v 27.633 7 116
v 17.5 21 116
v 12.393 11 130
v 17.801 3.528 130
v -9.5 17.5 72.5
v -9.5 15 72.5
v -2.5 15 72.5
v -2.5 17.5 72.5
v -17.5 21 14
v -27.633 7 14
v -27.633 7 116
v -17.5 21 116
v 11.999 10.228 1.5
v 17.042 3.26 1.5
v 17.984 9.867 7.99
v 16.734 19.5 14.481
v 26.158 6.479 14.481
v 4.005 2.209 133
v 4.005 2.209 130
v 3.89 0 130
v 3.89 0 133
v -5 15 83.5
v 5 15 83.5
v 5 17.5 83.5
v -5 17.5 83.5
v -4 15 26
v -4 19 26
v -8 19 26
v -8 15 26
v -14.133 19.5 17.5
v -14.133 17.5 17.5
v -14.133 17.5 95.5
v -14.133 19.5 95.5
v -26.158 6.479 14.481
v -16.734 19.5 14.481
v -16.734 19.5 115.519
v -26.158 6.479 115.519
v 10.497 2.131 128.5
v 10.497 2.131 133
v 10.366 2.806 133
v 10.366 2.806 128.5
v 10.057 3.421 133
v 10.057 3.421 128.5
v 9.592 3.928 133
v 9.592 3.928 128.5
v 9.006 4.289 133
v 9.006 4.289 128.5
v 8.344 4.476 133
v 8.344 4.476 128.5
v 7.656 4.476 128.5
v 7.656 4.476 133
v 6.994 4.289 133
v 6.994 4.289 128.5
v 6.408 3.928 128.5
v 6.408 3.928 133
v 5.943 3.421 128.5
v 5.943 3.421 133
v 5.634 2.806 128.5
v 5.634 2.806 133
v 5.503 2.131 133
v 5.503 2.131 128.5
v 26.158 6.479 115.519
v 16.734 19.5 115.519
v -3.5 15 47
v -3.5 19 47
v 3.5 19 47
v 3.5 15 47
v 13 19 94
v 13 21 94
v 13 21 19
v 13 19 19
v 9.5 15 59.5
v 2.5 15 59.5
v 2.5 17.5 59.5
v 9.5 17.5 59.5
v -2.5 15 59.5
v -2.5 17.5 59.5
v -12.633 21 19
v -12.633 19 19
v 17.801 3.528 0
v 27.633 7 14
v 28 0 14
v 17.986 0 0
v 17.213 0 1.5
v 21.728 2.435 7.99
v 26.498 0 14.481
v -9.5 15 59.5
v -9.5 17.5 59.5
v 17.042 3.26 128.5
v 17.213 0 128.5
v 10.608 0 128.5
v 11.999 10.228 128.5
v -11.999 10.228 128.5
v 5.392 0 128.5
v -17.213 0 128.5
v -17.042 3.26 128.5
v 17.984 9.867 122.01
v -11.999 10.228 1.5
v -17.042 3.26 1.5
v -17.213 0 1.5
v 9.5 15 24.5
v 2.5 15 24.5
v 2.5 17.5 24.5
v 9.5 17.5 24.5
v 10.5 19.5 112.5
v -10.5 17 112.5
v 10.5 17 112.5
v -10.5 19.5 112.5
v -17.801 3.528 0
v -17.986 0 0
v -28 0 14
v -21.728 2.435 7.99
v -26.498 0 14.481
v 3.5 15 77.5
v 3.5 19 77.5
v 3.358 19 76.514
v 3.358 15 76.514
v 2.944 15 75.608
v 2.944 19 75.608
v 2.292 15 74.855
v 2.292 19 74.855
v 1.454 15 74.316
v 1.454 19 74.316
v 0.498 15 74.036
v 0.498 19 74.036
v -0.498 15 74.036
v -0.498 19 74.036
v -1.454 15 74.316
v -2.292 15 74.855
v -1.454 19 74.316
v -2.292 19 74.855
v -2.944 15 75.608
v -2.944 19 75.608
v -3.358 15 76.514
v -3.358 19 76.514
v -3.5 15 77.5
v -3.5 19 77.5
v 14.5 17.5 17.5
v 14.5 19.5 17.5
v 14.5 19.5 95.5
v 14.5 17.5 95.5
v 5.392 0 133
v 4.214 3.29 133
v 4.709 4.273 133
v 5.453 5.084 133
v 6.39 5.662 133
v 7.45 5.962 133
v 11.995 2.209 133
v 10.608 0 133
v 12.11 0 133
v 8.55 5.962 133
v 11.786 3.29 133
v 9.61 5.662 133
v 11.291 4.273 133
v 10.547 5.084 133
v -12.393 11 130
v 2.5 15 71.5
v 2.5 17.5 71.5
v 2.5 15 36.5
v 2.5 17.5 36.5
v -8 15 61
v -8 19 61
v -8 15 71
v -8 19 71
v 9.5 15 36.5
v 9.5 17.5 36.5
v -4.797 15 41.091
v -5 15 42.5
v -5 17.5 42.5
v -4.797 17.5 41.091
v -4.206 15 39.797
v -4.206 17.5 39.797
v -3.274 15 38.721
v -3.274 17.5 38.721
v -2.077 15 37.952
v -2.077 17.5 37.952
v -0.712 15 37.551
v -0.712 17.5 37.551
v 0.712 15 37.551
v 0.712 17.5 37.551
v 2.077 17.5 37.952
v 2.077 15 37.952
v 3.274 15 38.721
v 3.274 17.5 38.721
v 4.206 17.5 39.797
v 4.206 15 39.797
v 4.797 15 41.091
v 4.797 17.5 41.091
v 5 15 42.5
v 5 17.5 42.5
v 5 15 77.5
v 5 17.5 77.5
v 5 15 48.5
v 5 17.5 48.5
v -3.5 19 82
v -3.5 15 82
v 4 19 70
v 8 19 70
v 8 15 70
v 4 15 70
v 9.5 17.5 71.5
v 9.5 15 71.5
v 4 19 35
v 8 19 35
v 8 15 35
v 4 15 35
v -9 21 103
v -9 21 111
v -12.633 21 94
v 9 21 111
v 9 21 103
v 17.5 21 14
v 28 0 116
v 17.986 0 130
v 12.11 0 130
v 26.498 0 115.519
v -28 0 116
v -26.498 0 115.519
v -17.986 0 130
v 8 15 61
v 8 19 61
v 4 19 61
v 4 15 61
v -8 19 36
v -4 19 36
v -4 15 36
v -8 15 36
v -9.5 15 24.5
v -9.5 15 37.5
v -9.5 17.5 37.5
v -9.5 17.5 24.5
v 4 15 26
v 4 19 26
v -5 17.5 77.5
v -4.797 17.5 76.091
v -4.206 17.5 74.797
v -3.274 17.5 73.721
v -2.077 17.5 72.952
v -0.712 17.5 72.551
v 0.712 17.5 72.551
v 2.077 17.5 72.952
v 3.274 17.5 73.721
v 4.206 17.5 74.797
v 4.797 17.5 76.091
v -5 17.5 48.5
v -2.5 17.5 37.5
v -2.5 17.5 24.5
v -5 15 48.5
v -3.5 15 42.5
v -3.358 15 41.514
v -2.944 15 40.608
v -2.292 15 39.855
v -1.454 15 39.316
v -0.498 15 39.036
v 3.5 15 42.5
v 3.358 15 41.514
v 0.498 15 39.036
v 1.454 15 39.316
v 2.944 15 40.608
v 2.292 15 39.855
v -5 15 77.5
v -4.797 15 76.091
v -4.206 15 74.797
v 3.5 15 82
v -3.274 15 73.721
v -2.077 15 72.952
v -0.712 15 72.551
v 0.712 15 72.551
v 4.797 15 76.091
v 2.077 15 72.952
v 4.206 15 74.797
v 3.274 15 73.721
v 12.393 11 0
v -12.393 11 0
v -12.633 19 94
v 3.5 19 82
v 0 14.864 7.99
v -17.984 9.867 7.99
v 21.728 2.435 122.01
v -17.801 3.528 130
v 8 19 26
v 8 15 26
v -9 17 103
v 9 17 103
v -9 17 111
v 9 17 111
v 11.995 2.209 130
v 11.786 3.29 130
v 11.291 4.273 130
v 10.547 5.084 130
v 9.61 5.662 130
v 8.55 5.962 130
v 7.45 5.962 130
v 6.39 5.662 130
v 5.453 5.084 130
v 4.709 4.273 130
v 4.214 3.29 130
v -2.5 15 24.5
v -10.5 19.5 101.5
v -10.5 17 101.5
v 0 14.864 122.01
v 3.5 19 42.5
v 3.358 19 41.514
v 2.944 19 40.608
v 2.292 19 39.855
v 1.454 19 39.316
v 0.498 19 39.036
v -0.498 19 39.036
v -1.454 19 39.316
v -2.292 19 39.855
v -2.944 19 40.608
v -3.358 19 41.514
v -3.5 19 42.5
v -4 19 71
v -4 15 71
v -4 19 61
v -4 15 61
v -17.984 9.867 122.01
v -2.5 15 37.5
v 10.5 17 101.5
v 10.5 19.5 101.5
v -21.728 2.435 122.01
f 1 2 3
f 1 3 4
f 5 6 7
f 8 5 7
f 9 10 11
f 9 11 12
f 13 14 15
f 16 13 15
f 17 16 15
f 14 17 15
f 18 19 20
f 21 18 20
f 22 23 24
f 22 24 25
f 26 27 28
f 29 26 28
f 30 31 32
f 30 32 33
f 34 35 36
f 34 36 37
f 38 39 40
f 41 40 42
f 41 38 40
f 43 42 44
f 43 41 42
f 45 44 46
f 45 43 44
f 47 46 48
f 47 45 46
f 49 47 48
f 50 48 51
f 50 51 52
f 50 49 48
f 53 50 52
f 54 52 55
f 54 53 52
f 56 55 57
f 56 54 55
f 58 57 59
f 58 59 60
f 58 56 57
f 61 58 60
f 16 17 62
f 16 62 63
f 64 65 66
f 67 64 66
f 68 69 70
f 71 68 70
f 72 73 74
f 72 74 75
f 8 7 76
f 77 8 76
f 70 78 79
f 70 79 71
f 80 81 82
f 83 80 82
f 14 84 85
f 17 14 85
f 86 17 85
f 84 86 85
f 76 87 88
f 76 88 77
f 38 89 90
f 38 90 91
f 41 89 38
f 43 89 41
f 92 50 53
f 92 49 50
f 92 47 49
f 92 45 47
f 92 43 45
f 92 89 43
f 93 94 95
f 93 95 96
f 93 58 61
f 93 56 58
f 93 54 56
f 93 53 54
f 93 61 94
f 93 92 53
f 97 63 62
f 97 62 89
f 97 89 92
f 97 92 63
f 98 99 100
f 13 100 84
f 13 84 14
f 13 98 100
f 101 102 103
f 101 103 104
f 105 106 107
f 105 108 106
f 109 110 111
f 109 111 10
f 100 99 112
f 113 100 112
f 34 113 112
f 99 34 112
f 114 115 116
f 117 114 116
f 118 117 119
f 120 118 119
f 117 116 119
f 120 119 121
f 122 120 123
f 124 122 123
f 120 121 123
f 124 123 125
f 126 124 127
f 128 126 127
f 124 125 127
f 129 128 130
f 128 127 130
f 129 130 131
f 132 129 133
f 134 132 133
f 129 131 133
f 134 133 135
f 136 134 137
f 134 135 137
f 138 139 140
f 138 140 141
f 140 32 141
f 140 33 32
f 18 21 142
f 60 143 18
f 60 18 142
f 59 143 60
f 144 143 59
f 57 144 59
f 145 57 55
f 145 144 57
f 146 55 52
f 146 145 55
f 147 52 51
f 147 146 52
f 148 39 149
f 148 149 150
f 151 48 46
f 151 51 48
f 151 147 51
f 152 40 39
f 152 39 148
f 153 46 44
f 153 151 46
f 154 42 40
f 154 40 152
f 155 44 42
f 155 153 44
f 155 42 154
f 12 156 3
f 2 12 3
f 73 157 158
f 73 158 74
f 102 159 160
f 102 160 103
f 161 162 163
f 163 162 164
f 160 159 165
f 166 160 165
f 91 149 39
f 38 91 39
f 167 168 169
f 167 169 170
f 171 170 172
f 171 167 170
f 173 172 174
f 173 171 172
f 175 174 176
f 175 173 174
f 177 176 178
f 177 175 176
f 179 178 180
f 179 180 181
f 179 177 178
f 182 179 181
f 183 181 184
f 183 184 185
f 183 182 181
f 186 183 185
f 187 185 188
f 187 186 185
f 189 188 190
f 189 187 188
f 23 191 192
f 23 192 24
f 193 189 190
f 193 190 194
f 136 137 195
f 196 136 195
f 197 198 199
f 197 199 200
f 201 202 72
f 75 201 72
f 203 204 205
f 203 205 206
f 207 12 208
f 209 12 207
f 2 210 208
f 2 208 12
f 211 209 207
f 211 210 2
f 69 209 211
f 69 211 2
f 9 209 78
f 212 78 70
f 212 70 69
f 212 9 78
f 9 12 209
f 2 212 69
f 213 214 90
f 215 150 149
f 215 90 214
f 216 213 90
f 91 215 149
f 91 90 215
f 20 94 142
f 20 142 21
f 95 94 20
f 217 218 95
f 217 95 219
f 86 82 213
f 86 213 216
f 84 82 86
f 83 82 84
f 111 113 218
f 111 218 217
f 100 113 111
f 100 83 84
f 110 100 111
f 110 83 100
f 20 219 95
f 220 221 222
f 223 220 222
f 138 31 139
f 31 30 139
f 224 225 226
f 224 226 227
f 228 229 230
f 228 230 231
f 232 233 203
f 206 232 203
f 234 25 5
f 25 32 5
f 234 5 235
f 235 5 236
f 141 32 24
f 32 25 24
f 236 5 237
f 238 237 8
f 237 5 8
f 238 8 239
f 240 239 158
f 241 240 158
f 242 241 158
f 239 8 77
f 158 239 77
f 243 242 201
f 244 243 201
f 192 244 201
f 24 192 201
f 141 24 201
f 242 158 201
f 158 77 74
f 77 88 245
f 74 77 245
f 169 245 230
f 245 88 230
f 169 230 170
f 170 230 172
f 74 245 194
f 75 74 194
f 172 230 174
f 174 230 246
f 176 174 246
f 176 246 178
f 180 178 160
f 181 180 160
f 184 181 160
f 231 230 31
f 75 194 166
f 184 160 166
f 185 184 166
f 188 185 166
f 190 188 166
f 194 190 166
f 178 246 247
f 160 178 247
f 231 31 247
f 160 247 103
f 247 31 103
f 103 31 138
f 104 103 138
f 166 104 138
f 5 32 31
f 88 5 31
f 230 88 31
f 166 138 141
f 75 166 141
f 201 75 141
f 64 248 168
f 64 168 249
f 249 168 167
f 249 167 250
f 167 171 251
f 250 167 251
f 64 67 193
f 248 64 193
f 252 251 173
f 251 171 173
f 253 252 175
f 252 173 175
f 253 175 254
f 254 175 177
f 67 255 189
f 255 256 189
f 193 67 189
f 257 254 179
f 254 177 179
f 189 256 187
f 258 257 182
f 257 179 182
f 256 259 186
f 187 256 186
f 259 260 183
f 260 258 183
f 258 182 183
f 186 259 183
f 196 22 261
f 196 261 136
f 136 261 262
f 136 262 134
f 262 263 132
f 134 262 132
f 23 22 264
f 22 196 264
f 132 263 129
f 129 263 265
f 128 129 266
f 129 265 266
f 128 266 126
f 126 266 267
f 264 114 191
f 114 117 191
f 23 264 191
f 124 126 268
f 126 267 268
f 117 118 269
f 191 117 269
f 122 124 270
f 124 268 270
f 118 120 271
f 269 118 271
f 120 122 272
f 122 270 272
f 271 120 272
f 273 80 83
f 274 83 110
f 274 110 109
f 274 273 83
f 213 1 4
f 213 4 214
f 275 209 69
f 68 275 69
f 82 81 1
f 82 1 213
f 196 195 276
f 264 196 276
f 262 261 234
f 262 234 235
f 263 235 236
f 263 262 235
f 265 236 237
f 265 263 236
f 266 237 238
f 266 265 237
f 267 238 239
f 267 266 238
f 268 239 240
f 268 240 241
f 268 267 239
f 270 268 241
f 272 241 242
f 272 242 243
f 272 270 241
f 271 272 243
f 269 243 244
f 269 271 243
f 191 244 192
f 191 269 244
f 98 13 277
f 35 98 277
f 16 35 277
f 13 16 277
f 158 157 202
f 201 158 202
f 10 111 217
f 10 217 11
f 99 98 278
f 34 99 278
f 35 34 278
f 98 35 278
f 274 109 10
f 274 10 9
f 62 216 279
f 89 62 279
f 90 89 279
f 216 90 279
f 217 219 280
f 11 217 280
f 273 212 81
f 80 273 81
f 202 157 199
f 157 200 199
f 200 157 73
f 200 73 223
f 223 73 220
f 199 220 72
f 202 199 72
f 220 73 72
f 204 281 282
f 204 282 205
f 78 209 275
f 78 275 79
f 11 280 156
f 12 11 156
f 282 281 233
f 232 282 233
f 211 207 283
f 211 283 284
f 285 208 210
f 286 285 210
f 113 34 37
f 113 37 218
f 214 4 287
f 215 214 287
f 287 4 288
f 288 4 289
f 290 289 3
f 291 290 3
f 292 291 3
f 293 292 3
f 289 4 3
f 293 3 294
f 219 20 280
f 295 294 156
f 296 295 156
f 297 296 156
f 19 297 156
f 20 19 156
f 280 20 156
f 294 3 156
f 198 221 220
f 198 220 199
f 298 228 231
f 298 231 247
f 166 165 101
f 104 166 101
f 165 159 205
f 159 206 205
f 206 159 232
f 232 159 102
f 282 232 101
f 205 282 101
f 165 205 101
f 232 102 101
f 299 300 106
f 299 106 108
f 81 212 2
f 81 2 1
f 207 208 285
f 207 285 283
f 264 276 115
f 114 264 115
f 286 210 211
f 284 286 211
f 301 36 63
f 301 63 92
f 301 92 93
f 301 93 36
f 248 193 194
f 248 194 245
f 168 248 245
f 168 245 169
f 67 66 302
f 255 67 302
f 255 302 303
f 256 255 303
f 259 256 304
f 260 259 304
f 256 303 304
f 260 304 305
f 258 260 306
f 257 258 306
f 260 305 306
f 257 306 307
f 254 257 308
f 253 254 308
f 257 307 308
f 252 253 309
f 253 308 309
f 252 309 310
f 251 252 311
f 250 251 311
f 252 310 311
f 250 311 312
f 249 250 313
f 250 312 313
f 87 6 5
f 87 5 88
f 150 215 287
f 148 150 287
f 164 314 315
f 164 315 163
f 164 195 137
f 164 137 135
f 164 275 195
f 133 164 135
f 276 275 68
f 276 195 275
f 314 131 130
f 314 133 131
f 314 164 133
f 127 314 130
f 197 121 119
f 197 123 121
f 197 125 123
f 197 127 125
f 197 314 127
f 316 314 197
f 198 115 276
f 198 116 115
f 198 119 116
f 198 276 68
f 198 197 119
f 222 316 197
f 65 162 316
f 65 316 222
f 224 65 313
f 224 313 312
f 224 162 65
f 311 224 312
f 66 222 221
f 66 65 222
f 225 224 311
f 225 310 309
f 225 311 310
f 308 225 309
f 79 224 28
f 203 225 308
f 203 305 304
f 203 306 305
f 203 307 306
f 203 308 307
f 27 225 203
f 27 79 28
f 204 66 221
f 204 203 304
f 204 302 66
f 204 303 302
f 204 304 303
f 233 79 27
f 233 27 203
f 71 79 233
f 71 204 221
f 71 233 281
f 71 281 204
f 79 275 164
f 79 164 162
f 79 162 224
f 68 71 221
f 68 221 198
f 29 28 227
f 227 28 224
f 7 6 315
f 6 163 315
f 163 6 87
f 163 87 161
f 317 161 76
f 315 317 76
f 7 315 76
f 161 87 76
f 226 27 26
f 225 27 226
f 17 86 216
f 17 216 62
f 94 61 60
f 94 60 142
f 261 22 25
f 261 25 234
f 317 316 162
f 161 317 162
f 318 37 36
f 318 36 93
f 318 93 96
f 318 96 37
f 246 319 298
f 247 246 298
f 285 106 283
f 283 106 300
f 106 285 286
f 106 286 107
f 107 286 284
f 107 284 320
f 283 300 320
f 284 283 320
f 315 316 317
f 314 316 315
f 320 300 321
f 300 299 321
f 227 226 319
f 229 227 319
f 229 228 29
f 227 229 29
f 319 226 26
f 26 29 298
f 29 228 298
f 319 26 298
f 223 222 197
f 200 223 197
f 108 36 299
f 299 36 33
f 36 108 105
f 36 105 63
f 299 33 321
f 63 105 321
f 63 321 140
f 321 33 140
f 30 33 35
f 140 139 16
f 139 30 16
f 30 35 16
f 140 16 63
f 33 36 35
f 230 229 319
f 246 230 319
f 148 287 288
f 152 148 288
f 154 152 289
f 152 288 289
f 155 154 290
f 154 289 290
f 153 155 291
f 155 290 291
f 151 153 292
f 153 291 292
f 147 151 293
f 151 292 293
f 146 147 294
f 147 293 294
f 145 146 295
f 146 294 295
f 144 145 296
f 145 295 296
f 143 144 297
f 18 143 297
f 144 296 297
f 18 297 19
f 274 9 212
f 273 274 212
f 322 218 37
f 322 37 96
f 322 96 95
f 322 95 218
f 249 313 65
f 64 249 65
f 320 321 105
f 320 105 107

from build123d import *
from OCP.BRepFilletAPI import BRepFilletAPI_MakeChamfer

# Parameters (mm, degrees)
EXTRUDE1_DEPTH       = 130
CHAMFER1_SIZE        = 14
CHAMFER1_SIZE2       = 10
CHAMFER2_SIZE        = 10
CHAMFER2_SIZE2       = 14
EXTRUDE2_DEPTH       = 3
SKETCH3_W            = 25.633145545
SKETCH3_H            = 75
CUT_EXTRUDE1_DEPTH   = 11
SKETCH4_W            = 4
SKETCH4_H            = 9
SKETCH4_H_2          = 10
CUT_EXTRUDE2_DEPTH   = 15
LPATTERN1_COUNT      = 2
LPATTERN1_PITCH      = 35
SKETCH5_W            = 18
SKETCH5_H            = 8
CUT_EXTRUDE3_DEPTH   = 13
SHELL1_OUTLINE_W     = 28.633145545
SHELL1_OUTLINE_H     = 78
SHELL1_OUTLINE_W_2   = 21
SHELL1_OUTLINE_H_2   = 11
SHELL1_DEPTH         = 15
SHELL1_START         = 15
SHELL1_2_OUTLINE_W   = 28.633145545
SHELL1_2_OUTLINE_H   = 78
SHELL1_2_OUTLINE_W_2 = 7
SHELL1_2_OUTLINE_H_2 = 13
SHELL1_2_OUTLINE_H_3 = 12
SHELL1_2_DEPTH       = 2.5
SHELL1_3_OUTLINE_W   = 21
SHELL1_3_OUTLINE_H   = 11
SHELL1_3_DEPTH       = 2
SHELL1_START_2       = 14.48069758
SHELL1_4_DEPTH       = 101.03860484
SHELL1_START_3       = 95.5
SHELL1_5_DEPTH       = 6
SHELL1_START_4       = 101.5
SHELL1_6_OUTLINE_W   = 3.633145545
SHELL1_6_OUTLINE_H   = 19.5
SHELL1_6_DEPTH       = 14.01930242
SHELL1_7_DEPTH       = 3.01930242
SHELL1_START_5       = 112.5
SHELL1_8_DEPTH       = 3.01930242
SHELL1_START_6       = 1.5
SHELL1_9_DEPTH       = 131.5


with BuildPart() as part:
    # Sketch1 → Extrude1 (new body)
    with BuildSketch(Plane.XY):
        Polygon((17.5, 21), (27.633145545, 7), (28, 0), (-28, 0), (-27.633145545, 7), (-17.5, 21), align=None)
    extrude(amount=EXTRUDE1_DEPTH)

    # Chamfer1: one chamfer whose edges measure the first distance from different faces: ONE call of the kernel's chamfer builder (chamfer() names one face for all edges)
    chamfer1_edges_1 = [part.edges().sort_by_distance(p)[0] for p in [
        (0, 21, 130),
    ]]
    chamfer1_side_1 = [part.faces().sort_by_distance(p)[0] for p in [
        (0, 21, 65),
    ]]
    chamfer1_edges_2 = [part.edges().sort_by_distance(p)[0] for p in [
        (-22.566572773, 14, 130),
    ]]
    chamfer1_side_2 = [part.faces().sort_by_distance(p)[0] for p in [
        (-22.566572773, 14, 65),
    ]]
    chamfer1_edges_3 = [part.edges().sort_by_distance(p)[0] for p in [
        (-27.816572773, 3.5, 130),
    ]]
    chamfer1_side_3 = [part.faces().sort_by_distance(p)[0] for p in [
        (-27.816572773, 3.5, 65),
    ]]
    chamfer1_edges_4 = [part.edges().sort_by_distance(p)[0] for p in [
        (27.816572773, 3.5, 130),
    ]]
    chamfer1_side_4 = [part.faces().sort_by_distance(p)[0] for p in [
        (27.816572773, 3.5, 65),
    ]]
    chamfer1_edges_5 = [part.edges().sort_by_distance(p)[0] for p in [
        (22.566572773, 14, 130),
    ]]
    chamfer1_side_5 = [part.faces().sort_by_distance(p)[0] for p in [
        (22.566572773, 14, 65),
    ]]
    chamfer1 = BRepFilletAPI_MakeChamfer(part.part.solid().wrapped)
    for e in chamfer1_edges_1:
        chamfer1.Add(CHAMFER1_SIZE, CHAMFER1_SIZE2, e.wrapped, chamfer1_side_1[0].wrapped)  # the first distance lies on this face
    for e in chamfer1_edges_2:
        chamfer1.Add(CHAMFER1_SIZE, CHAMFER1_SIZE2, e.wrapped, chamfer1_side_2[0].wrapped)  # the first distance lies on this face
    for e in chamfer1_edges_3:
        chamfer1.Add(CHAMFER1_SIZE, CHAMFER1_SIZE2, e.wrapped, chamfer1_side_3[0].wrapped)  # the first distance lies on this face
    for e in chamfer1_edges_4:
        chamfer1.Add(CHAMFER1_SIZE, CHAMFER1_SIZE2, e.wrapped, chamfer1_side_4[0].wrapped)  # the first distance lies on this face
    for e in chamfer1_edges_5:
        chamfer1.Add(CHAMFER1_SIZE, CHAMFER1_SIZE2, e.wrapped, chamfer1_side_5[0].wrapped)  # the first distance lies on this face
    add(Compound.cast(chamfer1.Shape()), mode=Mode.REPLACE)

    # Chamfer2
    chamfer2_edges = [part.edges().sort_by_distance(p)[0] for p in [
        (-27.816572773, 3.5, 0),
        (-22.566572773, 14, 0),
        (0, 21, 0),
        (22.566572773, 14, 0),
        (27.816572773, 3.5, 0),
    ]]
    chamfer2_side = [part.faces().sort_by_distance(p)[0] for p in [
        (0, 9.6691811, 0),
    ]]
    chamfer(chamfer2_edges, length=CHAMFER2_SIZE, length2=CHAMFER2_SIZE2, reference=chamfer2_side[0])

    # Sketch2 → Extrude2 (add)
    with BuildSketch(Plane(origin=(5.745184329, -1.894827458, 130), x_dir=(1, 0, 0), z_dir=(0, 0, 1))):
        with BuildLine():
            Line((-1.855489271, 1.894827458), (6.365120614, 1.894827458))
            Line((6.365120614, 1.894827458), (6.24933381, 4.104171283))
            ThreePointArc((6.24933381, 4.104171283), (2.254815671, 7.894827458), (-1.739702468, 4.104171283))
            Line((-1.739702468, 4.104171283), (-1.855489271, 1.894827458))
        make_face()
    extrude(amount=EXTRUDE2_DEPTH)

    # Sketch3 → Cut-Extrude1 (cut)
    with BuildSketch(Plane(origin=(3.492514123, 30, 107.578199621), x_dir=(1, 0, 0), z_dir=(0, 1, 0))):
        with Locations((-3.309086896, 51.078199621)):
            Rectangle(SKETCH3_W, SKETCH3_H)
    extrude(amount=-CUT_EXTRUDE1_DEPTH, mode=Mode.SUBTRACT)

    # Sketch4 → Cut-Extrude2 (cut)
    with BuildSketch(Plane(origin=(-3.08260661, 30, 40.468913064), x_dir=(-1, 0, 0), z_dir=(0, 1, 0))):
        with Locations((-9.08260661, -9.968913064)):
            Rectangle(SKETCH4_W, SKETCH4_H)
        with Locations((2.91739339, -9.468913064)):
            Rectangle(SKETCH4_W, SKETCH4_H_2)
        with BuildLine():
            Line((-6.58260661, 6.531086936), (-6.58260661, 2.031086936))
            ThreePointArc((-6.58260661, 2.031086936), (-3.08260661, -1.468913064), (0.41739339, 2.031086936))
            Line((0.41739339, 2.031086936), (0.41739339, 6.531086936))
            Line((0.41739339, 6.531086936), (-6.58260661, 6.531086936))
        make_face()
    cut_extrude2 = extrude(amount=-CUT_EXTRUDE2_DEPTH, mode=Mode.SUBTRACT)

    # LPattern1: Cut-Extrude2 ×2
    with Locations(*[(0, 0, i * LPATTERN1_PITCH) for i in range(1, LPATTERN1_COUNT)]):
        add(cut_extrude2, mode=Mode.SUBTRACT)

    # Sketch5 → Cut-Extrude3 (cut)
    with BuildSketch(Plane(origin=(0.792567218, 30, 213.513140982), x_dir=(1, 0, 0), z_dir=(0, 1, 0))):
        with Locations((-0.792567218, 106.513140982)):
            Rectangle(SKETCH5_W, SKETCH5_H)
    extrude(amount=-CUT_EXTRUDE3_DEPTH, mode=Mode.SUBTRACT)

    # Shell1: read off the stored shape, not the designer's step
    # Shell1 outline → Shell1 (cut)
    with BuildSketch(Plane(origin=(0, 0, 0), x_dir=(1, 0, 0), z_dir=(0, 1, 0))):
        with Locations((0.183427228, -56.5)):
            Rectangle(SHELL1_OUTLINE_W, SHELL1_OUTLINE_H)
        with Locations((0, -107)):
            Rectangle(SHELL1_OUTLINE_W_2, SHELL1_OUTLINE_H_2)
    extrude(amount=SHELL1_DEPTH, mode=Mode.SUBTRACT)

    # Shell1 2 outline → Shell1 2 (cut)
    with BuildSketch(Plane(origin=(0, 0, 0), x_dir=(1, 0, 0), z_dir=(0, 1, 0)).offset(SHELL1_START)):
        with Locations((0.183427228, -56.5)):
            Rectangle(SHELL1_2_OUTLINE_W, SHELL1_2_OUTLINE_H)
        with BuildLine():
            Line((-5, -83.5), (-5, -77.5))
            ThreePointArc((-5, -77.5), (0, -72.5), (5, -77.5))
            Line((5, -77.5), (5, -83.5))
            Line((5, -83.5), (-5, -83.5))
        make_face(mode=Mode.SUBTRACT)
        with Locations((-6, -66)):
            Rectangle(SHELL1_2_OUTLINE_W_2, SHELL1_2_OUTLINE_H_2, mode=Mode.SUBTRACT)
        with Locations((6, -65.5)):
            Rectangle(SHELL1_2_OUTLINE_W_2, SHELL1_2_OUTLINE_H_3, mode=Mode.SUBTRACT)
        with BuildLine():
            Line((-5, -48.5), (-5, -42.5))
            ThreePointArc((-5, -42.5), (0, -37.5), (5, -42.5))
            Line((5, -42.5), (5, -48.5))
            Line((5, -48.5), (-5, -48.5))
        make_face(mode=Mode.SUBTRACT)
        with Locations((-6, -31)):
            Rectangle(SHELL1_2_OUTLINE_W_2, SHELL1_2_OUTLINE_H_2, mode=Mode.SUBTRACT)
        with Locations((6, -30.5)):
            Rectangle(SHELL1_2_OUTLINE_W_2, SHELL1_2_OUTLINE_H_3, mode=Mode.SUBTRACT)
    extrude(amount=SHELL1_2_DEPTH, mode=Mode.SUBTRACT)

    # Shell1 3 outline → Shell1 3 (cut)
    with BuildSketch(Plane(origin=(0, 0, 0), x_dir=(1, 0, 0), z_dir=(0, 1, 0)).offset(SHELL1_START)):
        with Locations((0, -107)):
            Rectangle(SHELL1_3_OUTLINE_W, SHELL1_3_OUTLINE_H)
    extrude(amount=SHELL1_3_DEPTH, mode=Mode.SUBTRACT)

    # Shell1 4 outline → Shell1 4 (cut)
    with BuildSketch(Plane.XY.offset(SHELL1_START_2)):
        Polygon((26.497941481, 0), (26.158378339, 6.479250719), (16.734010656, 19.5), (14.5, 19.5), (14.5, 0), align=None)
        with BuildLine():
            Line((10.608246424, 0), (10.496573837, 2.130839891))
            ThreePointArc((10.496573837, 2.130839891), (8, 4.5), (5.503426163, 2.130839891))
            Line((5.503426163, 2.130839891), (5.391753576, 0))
            Line((5.391753576, 0), (10.608246424, 0))
        make_face()
        Polygon((-14.133145545, 0), (-14.133145545, 19.5), (-16.734010656, 19.5), (-26.158378339, 6.479250719), (-26.497941481, 0), align=None)
    extrude(amount=SHELL1_4_DEPTH, mode=Mode.SUBTRACT)

    # Shell1 5 outline → Shell1 5 (cut)
    with BuildSketch(Plane.XY.offset(SHELL1_START_3)):
        with BuildLine():
            Line((10.608246424, 0), (14.5, 0))
            Line((14.5, 0), (14.5, 19.5))
            Line((14.5, 19.5), (-14.133145545, 19.5))
            Line((-14.133145545, 19.5), (-14.133145545, 0))
            Line((-14.133145545, 0), (5.391753576, 0))
            Line((5.391753576, 0), (5.503426163, 2.130839891))
            ThreePointArc((5.503426163, 2.130839891), (8, 4.5), (10.496573837, 2.130839891))
            Line((10.496573837, 2.130839891), (10.608246424, 0))
        make_face()
    extrude(amount=SHELL1_5_DEPTH, mode=Mode.SUBTRACT)

    # Shell1 6 outline → Shell1 6 (cut)
    with BuildSketch(Plane.XY.offset(SHELL1_START_4)):
        Polygon((10.608246424, 0), (14.5, 0), (14.5, 19.5), (10.5, 19.5), (10.5, 2.065464807), align=None)
        with Locations((-12.316572773, 9.75)):
            Rectangle(SHELL1_6_OUTLINE_W, SHELL1_6_OUTLINE_H)
    extrude(amount=SHELL1_6_DEPTH, mode=Mode.SUBTRACT)

    # Shell1 7 outline → Shell1 7 (cut)
    with BuildSketch(Plane.XY.offset(SHELL1_START_2)):
        with BuildLine():
            Line((10.608246424, 0), (14.5, 0))
            Line((14.5, 0), (14.5, 19.5))
            Line((14.5, 19.5), (-14.133145545, 19.5))
            Line((-14.133145545, 19.5), (-14.133145545, 0))
            Line((-14.133145545, 0), (5.391753576, 0))
            Line((5.391753576, 0), (5.503426163, 2.130839891))
            ThreePointArc((5.503426163, 2.130839891), (8, 4.5), (10.496573837, 2.130839891))
            Line((10.496573837, 2.130839891), (10.608246424, 0))
        make_face()
    extrude(amount=SHELL1_7_DEPTH, mode=Mode.SUBTRACT)

    # Shell1 8 outline → Shell1 8 (cut)
    with BuildSketch(Plane.XY.offset(SHELL1_START_5)):
        with BuildLine():
            Line((10.5, 2.065464807), (10.5, 19.5))
            Line((10.5, 19.5), (-10.5, 19.5))
            Line((-10.5, 19.5), (-10.5, 0))
            Line((-10.5, 0), (5.391753576, 0))
            Line((5.391753576, 0), (5.503426163, 2.130839891))
            ThreePointArc((5.503426163, 2.130839891), (8, 4.5), (10.496573837, 2.130839891))
            Line((10.496573837, 2.130839891), (10.5, 2.065464807))
        make_face()
    extrude(amount=SHELL1_8_DEPTH, mode=Mode.SUBTRACT)

    # Shell1 9 outline → Shell1 9 (cut)
    with BuildSketch(Plane.XY.offset(SHELL1_START_6)):
        with BuildLine():
            Line((10.608246424, 0), (10.496573837, 2.130839891))
            ThreePointArc((10.496573837, 2.130839891), (8, 4.5), (5.503426163, 2.130839891))
            Line((5.503426163, 2.130839891), (5.391753576, 0))
            Line((5.391753576, 0), (10.608246424, 0))
        make_face()
    extrude(amount=SHELL1_9_DEPTH, mode=Mode.SUBTRACT)

    # Shell1 10: loft between two sections, ruled curve by curve
    shell1_10_from = [
        Edge.make_line((-26.497941481, 0, 115.51930242), (-26.158378339, 6.479250719, 115.51930242)),
        Edge.make_line((-26.158378339, 6.479250719, 115.51930242), (-16.734010656, 19.5, 115.51930242)),
        Edge.make_line((-16.734010656, 19.5, 115.51930242), (16.734010656, 19.5, 115.51930242)),
        Edge.make_line((16.734010656, 19.5, 115.51930242), (26.158378339, 6.479250719, 115.51930242)),
        Edge.make_line((26.497941481, 0, 115.51930242), (26.158378339, 6.479250719, 115.51930242)),
        Edge.make_line((26.497941481, 0, 115.51930242), (-26.497941481, 0, 115.51930242)),
    ]
    shell1_10_to = [
        Edge.make_line((-17.213290346, 0, 128.5), (-17.042422579, 3.260351225, 128.5)),
        Edge.make_line((-17.042422579, 3.260351225, 128.5), (-11.999212546, 10.228073157, 128.5)),
        Edge.make_line((-11.999212546, 10.228073157, 128.5), (11.999212546, 10.228073157, 128.5)),
        Edge.make_line((11.999212546, 10.228073157, 128.5), (17.042422579, 3.260351225, 128.5)),
        Edge.make_line((17.213290346, 0, 128.5), (17.042422579, 3.260351225, 128.5)),
        Edge.make_line((17.213290346, 0, 128.5), (-17.213290346, 0, 128.5)),
    ]
    shell1_10 = Solid(Shell([*[Face.make_surface_from_curves(shell1_10_from[k], shell1_10_to[k]) for k in range(6)], Face(Wire(shell1_10_from)), Face(Wire(shell1_10_to))]))
    add(shell1_10, mode=Mode.SUBTRACT)

    # Shell1 11: loft between two sections, ruled curve by curve
    shell1_11_from = [
        Edge.make_line((17.213290346, 0, 1.5), (17.042422579, 3.260351225, 1.5)),
        Edge.make_line((17.042422579, 3.260351225, 1.5), (11.999212546, 10.228073157, 1.5)),
        Edge.make_line((11.999212546, 10.228073157, 1.5), (-11.999212546, 10.228073157, 1.5)),
        Edge.make_line((-11.999212546, 10.228073157, 1.5), (-17.042422579, 3.260351225, 1.5)),
        Edge.make_line((-17.042422579, 3.260351225, 1.5), (-17.213290346, 0, 1.5)),
        Edge.make_line((-17.213290346, 0, 1.5), (17.213290346, 0, 1.5)),
    ]
    shell1_11_to = [
        Edge.make_line((26.497941481, 0, 14.48069758), (26.158378339, 6.479250719, 14.48069758)),
        Edge.make_line((26.158378339, 6.479250719, 14.48069758), (16.734010656, 19.5, 14.48069758)),
        Edge.make_line((16.734010656, 19.5, 14.48069758), (-16.734010656, 19.5, 14.48069758)),
        Edge.make_line((-16.734010656, 19.5, 14.48069758), (-26.158378339, 6.479250719, 14.48069758)),
        Edge.make_line((-26.158378339, 6.479250719, 14.48069758), (-26.497941481, 0, 14.48069758)),
        Edge.make_line((-26.497941481, 0, 14.48069758), (26.497941481, 0, 14.48069758)),
    ]
    shell1_11 = Solid(Shell([*[Face.make_surface_from_curves(shell1_11_from[k], shell1_11_to[k]) for k in range(6)], Face(Wire(shell1_11_from)), Face(Wire(shell1_11_to))]))
    add(shell1_11, mode=Mode.SUBTRACT)


solid = part.part
